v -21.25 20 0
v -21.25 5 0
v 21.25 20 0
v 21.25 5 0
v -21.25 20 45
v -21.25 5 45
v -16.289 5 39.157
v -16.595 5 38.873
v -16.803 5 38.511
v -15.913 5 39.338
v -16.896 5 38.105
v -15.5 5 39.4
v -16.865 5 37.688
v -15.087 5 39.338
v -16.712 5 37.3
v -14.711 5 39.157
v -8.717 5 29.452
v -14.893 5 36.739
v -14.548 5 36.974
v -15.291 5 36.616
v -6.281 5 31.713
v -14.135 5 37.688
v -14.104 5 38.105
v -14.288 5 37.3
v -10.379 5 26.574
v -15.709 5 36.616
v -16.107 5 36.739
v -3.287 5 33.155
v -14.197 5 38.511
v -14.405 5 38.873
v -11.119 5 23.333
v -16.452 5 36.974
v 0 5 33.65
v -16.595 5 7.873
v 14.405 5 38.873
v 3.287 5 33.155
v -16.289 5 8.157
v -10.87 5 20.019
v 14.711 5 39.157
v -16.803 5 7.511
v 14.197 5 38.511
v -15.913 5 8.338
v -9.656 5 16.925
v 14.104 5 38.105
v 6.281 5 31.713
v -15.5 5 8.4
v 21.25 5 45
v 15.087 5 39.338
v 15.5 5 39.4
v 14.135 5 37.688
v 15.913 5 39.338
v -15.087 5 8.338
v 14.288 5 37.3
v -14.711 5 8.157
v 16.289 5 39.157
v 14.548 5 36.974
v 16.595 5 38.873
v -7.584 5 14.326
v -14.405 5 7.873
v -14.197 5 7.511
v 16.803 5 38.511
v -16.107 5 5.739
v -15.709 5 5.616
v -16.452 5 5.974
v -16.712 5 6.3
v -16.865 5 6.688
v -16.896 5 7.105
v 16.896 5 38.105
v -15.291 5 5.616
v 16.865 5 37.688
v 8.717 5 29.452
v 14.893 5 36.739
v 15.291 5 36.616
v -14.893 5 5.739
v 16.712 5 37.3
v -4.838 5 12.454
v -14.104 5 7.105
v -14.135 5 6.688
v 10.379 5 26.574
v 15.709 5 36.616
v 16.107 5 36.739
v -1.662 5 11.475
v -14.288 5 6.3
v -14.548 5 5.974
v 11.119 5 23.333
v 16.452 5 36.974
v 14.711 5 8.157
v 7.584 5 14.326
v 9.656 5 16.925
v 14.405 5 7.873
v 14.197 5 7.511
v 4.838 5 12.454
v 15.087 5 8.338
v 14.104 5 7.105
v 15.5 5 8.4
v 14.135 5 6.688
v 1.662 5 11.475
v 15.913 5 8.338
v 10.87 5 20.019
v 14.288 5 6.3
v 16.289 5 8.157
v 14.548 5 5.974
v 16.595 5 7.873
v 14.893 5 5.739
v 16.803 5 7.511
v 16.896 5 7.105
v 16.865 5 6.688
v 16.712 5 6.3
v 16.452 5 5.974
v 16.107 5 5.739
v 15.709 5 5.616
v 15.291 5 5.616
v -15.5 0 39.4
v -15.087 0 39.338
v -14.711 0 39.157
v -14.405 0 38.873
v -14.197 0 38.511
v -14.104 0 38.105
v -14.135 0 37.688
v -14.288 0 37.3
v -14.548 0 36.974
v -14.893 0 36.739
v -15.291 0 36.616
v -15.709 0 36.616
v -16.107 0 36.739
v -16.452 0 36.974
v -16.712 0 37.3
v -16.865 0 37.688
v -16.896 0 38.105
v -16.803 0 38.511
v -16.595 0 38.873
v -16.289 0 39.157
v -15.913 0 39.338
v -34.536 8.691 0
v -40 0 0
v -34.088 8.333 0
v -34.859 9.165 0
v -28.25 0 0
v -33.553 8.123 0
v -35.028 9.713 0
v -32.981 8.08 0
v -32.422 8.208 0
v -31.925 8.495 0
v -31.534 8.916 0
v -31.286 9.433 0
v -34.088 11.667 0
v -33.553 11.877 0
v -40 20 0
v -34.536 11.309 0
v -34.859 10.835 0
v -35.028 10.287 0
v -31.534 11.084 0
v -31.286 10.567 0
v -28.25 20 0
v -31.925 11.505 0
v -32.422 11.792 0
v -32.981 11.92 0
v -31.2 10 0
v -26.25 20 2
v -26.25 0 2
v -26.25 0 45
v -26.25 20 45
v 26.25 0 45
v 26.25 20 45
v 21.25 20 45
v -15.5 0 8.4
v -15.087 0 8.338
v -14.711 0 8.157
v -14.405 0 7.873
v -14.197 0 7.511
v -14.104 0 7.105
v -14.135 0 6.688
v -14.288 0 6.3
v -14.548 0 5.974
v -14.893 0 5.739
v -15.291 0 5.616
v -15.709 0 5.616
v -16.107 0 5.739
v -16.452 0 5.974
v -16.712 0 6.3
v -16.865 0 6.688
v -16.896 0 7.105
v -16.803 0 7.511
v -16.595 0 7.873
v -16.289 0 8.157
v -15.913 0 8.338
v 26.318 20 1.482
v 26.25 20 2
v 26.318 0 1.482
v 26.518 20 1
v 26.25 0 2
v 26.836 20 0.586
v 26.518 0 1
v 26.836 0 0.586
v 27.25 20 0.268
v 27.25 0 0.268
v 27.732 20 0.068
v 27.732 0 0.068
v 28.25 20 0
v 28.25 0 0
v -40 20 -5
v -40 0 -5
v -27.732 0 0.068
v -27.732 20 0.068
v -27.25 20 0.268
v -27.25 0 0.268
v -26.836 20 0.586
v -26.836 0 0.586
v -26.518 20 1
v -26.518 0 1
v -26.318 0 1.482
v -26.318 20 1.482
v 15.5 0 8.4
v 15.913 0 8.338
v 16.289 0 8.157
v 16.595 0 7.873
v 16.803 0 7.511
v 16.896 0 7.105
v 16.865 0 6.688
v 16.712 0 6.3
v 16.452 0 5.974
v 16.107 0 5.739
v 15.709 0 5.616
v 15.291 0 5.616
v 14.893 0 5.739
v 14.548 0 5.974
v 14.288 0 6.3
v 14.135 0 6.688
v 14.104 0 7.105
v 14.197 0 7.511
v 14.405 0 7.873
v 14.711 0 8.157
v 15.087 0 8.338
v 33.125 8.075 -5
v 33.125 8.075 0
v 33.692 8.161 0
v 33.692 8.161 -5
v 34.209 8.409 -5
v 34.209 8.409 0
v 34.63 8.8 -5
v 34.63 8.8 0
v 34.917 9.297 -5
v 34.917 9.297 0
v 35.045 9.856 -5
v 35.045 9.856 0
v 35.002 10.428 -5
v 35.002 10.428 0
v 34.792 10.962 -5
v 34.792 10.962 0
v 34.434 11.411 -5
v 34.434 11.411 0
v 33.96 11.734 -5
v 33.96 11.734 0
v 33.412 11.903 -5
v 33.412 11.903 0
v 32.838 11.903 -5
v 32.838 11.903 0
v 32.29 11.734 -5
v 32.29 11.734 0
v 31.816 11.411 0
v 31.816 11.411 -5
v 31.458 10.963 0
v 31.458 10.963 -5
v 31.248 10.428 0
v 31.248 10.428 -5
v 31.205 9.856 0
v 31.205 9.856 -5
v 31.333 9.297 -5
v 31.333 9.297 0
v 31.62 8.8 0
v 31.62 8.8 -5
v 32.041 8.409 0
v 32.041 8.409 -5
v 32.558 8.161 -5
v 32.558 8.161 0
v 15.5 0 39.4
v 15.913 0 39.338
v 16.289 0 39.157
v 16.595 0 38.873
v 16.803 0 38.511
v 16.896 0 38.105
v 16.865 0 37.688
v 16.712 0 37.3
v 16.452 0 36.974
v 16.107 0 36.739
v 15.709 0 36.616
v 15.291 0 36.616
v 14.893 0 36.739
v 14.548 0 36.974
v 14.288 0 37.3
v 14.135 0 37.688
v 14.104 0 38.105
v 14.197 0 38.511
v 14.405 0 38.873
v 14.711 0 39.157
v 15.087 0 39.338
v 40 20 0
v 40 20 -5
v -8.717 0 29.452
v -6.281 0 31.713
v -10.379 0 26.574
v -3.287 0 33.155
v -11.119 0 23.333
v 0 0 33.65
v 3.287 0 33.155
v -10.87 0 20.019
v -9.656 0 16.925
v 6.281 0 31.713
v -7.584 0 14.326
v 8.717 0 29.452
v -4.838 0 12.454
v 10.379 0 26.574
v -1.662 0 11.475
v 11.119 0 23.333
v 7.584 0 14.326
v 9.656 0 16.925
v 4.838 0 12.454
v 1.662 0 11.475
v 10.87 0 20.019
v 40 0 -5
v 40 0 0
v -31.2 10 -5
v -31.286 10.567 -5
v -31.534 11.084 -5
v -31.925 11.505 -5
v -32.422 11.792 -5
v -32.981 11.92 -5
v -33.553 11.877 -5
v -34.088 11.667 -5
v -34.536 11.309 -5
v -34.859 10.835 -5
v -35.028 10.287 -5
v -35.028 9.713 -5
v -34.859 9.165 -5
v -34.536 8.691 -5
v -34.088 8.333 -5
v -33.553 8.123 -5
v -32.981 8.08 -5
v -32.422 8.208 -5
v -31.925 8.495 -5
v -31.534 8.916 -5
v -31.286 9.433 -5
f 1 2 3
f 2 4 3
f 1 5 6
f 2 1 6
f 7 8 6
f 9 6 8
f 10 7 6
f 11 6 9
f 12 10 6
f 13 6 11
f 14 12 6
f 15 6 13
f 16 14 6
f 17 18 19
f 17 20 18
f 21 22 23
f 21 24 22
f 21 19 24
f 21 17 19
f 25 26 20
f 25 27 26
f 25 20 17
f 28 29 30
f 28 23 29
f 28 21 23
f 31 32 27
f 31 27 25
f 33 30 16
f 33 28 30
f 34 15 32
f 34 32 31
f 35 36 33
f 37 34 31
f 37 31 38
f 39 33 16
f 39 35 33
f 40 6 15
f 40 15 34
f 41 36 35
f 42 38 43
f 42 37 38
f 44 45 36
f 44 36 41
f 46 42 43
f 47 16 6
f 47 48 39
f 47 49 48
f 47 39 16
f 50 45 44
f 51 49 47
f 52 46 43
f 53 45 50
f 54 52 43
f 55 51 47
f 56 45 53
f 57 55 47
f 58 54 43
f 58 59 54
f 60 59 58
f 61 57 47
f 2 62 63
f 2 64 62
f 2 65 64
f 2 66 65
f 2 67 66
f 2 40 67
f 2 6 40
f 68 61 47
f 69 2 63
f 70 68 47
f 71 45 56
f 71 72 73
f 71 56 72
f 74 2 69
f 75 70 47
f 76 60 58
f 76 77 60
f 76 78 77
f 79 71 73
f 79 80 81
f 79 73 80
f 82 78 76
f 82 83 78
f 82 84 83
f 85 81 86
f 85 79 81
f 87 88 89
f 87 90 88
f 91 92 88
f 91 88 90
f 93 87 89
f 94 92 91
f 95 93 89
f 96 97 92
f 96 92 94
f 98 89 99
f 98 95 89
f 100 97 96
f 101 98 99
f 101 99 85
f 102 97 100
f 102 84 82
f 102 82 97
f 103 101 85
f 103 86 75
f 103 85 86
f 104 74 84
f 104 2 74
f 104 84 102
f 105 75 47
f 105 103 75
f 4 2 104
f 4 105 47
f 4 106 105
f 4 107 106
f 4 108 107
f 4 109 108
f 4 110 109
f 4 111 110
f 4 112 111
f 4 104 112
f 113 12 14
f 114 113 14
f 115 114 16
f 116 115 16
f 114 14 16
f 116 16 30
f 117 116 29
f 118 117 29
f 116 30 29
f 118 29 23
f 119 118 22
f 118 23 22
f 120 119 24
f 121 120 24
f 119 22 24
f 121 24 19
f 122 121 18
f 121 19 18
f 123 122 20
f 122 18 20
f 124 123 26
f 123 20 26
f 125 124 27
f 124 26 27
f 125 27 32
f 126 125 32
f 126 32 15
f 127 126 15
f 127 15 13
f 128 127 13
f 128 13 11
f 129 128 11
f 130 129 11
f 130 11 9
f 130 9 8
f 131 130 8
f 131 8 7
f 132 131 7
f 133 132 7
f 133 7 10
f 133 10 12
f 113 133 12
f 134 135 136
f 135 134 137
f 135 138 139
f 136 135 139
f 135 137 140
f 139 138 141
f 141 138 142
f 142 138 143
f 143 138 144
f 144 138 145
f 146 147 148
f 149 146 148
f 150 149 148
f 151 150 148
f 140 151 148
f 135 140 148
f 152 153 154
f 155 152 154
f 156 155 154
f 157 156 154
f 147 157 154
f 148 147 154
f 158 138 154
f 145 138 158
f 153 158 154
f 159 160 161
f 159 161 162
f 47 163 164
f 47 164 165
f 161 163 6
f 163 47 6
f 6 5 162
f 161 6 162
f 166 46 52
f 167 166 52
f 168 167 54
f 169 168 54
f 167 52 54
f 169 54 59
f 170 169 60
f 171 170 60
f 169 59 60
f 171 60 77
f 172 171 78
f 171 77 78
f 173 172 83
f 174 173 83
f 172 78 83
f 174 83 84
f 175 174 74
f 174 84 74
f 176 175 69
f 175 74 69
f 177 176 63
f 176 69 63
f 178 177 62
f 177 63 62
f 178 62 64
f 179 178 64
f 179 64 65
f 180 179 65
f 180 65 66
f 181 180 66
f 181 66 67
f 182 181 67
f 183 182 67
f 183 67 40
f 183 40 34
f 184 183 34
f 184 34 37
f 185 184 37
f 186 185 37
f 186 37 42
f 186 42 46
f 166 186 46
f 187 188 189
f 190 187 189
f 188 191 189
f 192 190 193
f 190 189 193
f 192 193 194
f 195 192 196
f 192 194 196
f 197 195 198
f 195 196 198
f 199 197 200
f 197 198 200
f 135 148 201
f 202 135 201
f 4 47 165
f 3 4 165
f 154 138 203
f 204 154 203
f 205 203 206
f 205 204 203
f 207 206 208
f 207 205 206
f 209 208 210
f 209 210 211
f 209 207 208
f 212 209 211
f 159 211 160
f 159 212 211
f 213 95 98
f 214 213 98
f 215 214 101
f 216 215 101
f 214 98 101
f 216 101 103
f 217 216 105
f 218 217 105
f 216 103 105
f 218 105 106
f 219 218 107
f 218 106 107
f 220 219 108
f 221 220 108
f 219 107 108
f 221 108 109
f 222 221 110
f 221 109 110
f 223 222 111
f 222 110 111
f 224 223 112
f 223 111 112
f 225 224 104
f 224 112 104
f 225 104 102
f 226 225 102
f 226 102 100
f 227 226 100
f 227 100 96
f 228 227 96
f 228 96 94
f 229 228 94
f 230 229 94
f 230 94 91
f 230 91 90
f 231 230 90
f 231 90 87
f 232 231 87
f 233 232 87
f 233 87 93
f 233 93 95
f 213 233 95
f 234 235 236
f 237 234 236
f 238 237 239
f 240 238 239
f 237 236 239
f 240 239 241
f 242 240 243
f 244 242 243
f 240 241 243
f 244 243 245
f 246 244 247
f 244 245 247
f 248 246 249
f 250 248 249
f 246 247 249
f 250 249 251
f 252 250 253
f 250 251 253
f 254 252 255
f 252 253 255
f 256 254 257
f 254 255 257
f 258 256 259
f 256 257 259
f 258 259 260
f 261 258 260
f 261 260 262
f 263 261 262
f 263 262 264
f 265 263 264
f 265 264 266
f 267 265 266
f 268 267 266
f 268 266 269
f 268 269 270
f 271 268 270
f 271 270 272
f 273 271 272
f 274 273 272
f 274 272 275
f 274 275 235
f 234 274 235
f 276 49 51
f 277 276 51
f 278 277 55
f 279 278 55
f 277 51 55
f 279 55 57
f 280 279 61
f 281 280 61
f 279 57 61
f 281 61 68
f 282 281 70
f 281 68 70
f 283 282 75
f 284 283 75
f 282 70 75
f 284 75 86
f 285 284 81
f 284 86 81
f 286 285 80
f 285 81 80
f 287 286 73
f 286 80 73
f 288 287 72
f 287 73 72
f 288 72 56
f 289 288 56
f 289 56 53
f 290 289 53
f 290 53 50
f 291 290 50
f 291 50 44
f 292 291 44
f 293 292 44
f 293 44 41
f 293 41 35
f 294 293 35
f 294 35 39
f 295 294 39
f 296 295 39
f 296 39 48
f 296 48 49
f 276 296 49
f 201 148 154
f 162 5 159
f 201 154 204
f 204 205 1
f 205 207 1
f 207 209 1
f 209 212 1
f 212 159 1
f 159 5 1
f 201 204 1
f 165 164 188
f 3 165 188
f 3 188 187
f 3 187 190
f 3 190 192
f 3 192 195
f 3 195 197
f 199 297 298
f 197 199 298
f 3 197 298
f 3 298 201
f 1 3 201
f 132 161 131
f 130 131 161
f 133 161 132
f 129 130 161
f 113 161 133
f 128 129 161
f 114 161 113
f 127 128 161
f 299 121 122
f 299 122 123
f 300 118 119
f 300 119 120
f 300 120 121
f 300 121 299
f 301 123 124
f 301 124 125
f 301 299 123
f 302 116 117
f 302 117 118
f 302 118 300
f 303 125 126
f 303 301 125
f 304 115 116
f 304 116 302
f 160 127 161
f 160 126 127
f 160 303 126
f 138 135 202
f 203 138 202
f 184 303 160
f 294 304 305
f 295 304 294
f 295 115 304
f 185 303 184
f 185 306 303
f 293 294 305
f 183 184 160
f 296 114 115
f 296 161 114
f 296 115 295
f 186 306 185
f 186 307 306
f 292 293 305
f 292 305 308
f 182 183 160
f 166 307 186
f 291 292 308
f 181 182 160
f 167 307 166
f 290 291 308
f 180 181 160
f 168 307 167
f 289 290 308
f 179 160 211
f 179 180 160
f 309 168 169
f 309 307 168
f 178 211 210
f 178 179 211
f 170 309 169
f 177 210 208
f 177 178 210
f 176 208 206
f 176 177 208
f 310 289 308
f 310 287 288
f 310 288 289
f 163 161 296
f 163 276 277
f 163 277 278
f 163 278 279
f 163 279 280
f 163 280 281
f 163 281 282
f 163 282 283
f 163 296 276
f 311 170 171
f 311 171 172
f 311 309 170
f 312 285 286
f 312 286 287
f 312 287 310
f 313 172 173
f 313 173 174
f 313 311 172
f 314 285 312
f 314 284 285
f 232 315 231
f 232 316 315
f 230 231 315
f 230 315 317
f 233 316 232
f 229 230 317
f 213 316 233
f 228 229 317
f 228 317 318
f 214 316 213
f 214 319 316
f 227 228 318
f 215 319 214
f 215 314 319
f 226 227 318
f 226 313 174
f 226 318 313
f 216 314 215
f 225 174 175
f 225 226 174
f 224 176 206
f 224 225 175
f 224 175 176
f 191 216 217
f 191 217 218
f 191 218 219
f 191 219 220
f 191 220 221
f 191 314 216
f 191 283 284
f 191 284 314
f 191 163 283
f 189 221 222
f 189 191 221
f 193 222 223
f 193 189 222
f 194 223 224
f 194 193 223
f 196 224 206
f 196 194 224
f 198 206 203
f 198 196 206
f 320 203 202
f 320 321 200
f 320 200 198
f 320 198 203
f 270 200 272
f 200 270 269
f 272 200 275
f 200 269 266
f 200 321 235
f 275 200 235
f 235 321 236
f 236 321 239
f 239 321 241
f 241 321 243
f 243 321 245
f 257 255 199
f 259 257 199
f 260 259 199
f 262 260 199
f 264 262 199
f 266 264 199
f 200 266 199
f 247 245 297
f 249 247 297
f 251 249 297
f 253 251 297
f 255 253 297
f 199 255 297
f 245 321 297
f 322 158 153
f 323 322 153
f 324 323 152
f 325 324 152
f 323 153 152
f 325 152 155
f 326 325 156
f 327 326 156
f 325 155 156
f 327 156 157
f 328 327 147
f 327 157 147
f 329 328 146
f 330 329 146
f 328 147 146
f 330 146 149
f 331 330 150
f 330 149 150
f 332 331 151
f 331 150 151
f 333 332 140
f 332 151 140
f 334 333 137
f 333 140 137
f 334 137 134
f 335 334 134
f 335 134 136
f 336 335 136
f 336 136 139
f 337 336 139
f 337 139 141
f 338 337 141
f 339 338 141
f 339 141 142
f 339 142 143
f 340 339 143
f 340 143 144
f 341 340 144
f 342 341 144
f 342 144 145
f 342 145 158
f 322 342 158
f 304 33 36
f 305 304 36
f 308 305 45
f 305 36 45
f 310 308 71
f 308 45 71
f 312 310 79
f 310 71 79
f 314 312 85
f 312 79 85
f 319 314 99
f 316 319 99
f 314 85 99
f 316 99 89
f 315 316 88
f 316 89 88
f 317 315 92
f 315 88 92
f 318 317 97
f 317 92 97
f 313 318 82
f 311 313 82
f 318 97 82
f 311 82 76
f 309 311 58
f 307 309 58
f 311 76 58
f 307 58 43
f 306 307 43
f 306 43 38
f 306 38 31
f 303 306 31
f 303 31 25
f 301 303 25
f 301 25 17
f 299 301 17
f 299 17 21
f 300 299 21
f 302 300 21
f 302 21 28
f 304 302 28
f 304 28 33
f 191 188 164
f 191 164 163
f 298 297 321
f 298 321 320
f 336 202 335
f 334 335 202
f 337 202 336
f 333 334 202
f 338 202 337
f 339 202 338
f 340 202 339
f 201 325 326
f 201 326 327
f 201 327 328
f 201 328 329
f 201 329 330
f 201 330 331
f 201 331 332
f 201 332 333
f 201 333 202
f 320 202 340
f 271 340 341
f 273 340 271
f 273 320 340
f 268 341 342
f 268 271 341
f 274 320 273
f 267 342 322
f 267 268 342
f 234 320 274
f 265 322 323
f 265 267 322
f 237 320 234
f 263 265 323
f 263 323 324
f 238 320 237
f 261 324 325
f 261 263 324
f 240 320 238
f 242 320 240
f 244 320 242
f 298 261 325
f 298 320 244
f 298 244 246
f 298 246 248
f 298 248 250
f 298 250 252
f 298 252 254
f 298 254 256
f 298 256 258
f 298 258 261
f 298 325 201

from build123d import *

# Parameters (mm, degrees)
BOSS_EXTRUDE1_DEPTH = 45
SKETCH2_W           = 5
SKETCH2_H           = 20
BOSS_EXTRUDE3_DEPTH = 40
SKETCH3_R           = 1.925
CUT_EXTRUDE1_DEPTH  = 200
SKETCH4_R           = 11.15
CUT_EXTRUDE2_DEPTH  = 200
SKETCH5_R           = 1.4
CUT_EXTRUDE3_DEPTH  = 200
FILLET1_R           = 2


with BuildPart() as part:
    # Sketch1 → Boss-Extrude1 (new body)
    with BuildSketch(Plane.XY):
        Polygon((26.25, 0), (-26.25, 0), (-26.25, 20), (-21.25, 20), (-21.25, 5), (21.25, 5), (21.25, 20), (26.25, 20), align=None)
    extrude(amount=BOSS_EXTRUDE1_DEPTH)

    # Sketch2 → Boss-Extrude3 (add, symmetric)
    with BuildSketch(Plane(origin=(0, 0, 0), x_dir=(0, 0, -1), z_dir=(1, 0, 0))):
        with Locations((2.5, 10)):
            Rectangle(SKETCH2_W, SKETCH2_H)
    extrude(amount=BOSS_EXTRUDE3_DEPTH, both=True)

    # Sketch3 → Cut-Extrude1 (cut)
    with BuildSketch(Plane.XY):
        with Locations((-33.125, 10)):
            Circle(SKETCH3_R)
        with Locations(Location((33.125, 10, 0), (0, 0, 270))):
            Circle(SKETCH3_R)
    extrude(amount=-CUT_EXTRUDE1_DEPTH, mode=Mode.SUBTRACT)

    # Sketch4 → Cut-Extrude2 (cut)
    with BuildSketch(Plane(origin=(0, 5, 0), x_dir=(1, 0, 0), z_dir=(0, 1, 0))):
        with Locations(Location((0, -22.5, 0), (0, 0, 270))):
            Circle(SKETCH4_R)
    extrude(amount=-CUT_EXTRUDE2_DEPTH, mode=Mode.SUBTRACT)

    # Sketch5 → Cut-Extrude3 (cut)
    with BuildSketch(Plane(origin=(0, 5, 0), x_dir=(1, 0, 0), z_dir=(0, 1, 0))):
        with Locations(Location((-15.5, -7, 0), (0, 0, 270))):
            Circle(SKETCH5_R)
        with Locations(Location((15.5, -7, 0), (0, 0, 270))):
            Circle(SKETCH5_R)
        with Locations(Location((-15.5, -38, 0), (0, 0, 270))):
            Circle(SKETCH5_R)
        with Locations(Location((15.5, -38, 0), (0, 0, 270))):
            Circle(SKETCH5_R)
    extrude(amount=-CUT_EXTRUDE3_DEPTH, mode=Mode.SUBTRACT)

    # Fillet1
    fillet1_edges = [part.edges().sort_by_distance(p)[0] for p in [
        (-26.25, 10, 0),
        (26.25, 10, 0),
    ]]
    fillet(fillet1_edges, radius=FILLET1_R)


solid = part.part
